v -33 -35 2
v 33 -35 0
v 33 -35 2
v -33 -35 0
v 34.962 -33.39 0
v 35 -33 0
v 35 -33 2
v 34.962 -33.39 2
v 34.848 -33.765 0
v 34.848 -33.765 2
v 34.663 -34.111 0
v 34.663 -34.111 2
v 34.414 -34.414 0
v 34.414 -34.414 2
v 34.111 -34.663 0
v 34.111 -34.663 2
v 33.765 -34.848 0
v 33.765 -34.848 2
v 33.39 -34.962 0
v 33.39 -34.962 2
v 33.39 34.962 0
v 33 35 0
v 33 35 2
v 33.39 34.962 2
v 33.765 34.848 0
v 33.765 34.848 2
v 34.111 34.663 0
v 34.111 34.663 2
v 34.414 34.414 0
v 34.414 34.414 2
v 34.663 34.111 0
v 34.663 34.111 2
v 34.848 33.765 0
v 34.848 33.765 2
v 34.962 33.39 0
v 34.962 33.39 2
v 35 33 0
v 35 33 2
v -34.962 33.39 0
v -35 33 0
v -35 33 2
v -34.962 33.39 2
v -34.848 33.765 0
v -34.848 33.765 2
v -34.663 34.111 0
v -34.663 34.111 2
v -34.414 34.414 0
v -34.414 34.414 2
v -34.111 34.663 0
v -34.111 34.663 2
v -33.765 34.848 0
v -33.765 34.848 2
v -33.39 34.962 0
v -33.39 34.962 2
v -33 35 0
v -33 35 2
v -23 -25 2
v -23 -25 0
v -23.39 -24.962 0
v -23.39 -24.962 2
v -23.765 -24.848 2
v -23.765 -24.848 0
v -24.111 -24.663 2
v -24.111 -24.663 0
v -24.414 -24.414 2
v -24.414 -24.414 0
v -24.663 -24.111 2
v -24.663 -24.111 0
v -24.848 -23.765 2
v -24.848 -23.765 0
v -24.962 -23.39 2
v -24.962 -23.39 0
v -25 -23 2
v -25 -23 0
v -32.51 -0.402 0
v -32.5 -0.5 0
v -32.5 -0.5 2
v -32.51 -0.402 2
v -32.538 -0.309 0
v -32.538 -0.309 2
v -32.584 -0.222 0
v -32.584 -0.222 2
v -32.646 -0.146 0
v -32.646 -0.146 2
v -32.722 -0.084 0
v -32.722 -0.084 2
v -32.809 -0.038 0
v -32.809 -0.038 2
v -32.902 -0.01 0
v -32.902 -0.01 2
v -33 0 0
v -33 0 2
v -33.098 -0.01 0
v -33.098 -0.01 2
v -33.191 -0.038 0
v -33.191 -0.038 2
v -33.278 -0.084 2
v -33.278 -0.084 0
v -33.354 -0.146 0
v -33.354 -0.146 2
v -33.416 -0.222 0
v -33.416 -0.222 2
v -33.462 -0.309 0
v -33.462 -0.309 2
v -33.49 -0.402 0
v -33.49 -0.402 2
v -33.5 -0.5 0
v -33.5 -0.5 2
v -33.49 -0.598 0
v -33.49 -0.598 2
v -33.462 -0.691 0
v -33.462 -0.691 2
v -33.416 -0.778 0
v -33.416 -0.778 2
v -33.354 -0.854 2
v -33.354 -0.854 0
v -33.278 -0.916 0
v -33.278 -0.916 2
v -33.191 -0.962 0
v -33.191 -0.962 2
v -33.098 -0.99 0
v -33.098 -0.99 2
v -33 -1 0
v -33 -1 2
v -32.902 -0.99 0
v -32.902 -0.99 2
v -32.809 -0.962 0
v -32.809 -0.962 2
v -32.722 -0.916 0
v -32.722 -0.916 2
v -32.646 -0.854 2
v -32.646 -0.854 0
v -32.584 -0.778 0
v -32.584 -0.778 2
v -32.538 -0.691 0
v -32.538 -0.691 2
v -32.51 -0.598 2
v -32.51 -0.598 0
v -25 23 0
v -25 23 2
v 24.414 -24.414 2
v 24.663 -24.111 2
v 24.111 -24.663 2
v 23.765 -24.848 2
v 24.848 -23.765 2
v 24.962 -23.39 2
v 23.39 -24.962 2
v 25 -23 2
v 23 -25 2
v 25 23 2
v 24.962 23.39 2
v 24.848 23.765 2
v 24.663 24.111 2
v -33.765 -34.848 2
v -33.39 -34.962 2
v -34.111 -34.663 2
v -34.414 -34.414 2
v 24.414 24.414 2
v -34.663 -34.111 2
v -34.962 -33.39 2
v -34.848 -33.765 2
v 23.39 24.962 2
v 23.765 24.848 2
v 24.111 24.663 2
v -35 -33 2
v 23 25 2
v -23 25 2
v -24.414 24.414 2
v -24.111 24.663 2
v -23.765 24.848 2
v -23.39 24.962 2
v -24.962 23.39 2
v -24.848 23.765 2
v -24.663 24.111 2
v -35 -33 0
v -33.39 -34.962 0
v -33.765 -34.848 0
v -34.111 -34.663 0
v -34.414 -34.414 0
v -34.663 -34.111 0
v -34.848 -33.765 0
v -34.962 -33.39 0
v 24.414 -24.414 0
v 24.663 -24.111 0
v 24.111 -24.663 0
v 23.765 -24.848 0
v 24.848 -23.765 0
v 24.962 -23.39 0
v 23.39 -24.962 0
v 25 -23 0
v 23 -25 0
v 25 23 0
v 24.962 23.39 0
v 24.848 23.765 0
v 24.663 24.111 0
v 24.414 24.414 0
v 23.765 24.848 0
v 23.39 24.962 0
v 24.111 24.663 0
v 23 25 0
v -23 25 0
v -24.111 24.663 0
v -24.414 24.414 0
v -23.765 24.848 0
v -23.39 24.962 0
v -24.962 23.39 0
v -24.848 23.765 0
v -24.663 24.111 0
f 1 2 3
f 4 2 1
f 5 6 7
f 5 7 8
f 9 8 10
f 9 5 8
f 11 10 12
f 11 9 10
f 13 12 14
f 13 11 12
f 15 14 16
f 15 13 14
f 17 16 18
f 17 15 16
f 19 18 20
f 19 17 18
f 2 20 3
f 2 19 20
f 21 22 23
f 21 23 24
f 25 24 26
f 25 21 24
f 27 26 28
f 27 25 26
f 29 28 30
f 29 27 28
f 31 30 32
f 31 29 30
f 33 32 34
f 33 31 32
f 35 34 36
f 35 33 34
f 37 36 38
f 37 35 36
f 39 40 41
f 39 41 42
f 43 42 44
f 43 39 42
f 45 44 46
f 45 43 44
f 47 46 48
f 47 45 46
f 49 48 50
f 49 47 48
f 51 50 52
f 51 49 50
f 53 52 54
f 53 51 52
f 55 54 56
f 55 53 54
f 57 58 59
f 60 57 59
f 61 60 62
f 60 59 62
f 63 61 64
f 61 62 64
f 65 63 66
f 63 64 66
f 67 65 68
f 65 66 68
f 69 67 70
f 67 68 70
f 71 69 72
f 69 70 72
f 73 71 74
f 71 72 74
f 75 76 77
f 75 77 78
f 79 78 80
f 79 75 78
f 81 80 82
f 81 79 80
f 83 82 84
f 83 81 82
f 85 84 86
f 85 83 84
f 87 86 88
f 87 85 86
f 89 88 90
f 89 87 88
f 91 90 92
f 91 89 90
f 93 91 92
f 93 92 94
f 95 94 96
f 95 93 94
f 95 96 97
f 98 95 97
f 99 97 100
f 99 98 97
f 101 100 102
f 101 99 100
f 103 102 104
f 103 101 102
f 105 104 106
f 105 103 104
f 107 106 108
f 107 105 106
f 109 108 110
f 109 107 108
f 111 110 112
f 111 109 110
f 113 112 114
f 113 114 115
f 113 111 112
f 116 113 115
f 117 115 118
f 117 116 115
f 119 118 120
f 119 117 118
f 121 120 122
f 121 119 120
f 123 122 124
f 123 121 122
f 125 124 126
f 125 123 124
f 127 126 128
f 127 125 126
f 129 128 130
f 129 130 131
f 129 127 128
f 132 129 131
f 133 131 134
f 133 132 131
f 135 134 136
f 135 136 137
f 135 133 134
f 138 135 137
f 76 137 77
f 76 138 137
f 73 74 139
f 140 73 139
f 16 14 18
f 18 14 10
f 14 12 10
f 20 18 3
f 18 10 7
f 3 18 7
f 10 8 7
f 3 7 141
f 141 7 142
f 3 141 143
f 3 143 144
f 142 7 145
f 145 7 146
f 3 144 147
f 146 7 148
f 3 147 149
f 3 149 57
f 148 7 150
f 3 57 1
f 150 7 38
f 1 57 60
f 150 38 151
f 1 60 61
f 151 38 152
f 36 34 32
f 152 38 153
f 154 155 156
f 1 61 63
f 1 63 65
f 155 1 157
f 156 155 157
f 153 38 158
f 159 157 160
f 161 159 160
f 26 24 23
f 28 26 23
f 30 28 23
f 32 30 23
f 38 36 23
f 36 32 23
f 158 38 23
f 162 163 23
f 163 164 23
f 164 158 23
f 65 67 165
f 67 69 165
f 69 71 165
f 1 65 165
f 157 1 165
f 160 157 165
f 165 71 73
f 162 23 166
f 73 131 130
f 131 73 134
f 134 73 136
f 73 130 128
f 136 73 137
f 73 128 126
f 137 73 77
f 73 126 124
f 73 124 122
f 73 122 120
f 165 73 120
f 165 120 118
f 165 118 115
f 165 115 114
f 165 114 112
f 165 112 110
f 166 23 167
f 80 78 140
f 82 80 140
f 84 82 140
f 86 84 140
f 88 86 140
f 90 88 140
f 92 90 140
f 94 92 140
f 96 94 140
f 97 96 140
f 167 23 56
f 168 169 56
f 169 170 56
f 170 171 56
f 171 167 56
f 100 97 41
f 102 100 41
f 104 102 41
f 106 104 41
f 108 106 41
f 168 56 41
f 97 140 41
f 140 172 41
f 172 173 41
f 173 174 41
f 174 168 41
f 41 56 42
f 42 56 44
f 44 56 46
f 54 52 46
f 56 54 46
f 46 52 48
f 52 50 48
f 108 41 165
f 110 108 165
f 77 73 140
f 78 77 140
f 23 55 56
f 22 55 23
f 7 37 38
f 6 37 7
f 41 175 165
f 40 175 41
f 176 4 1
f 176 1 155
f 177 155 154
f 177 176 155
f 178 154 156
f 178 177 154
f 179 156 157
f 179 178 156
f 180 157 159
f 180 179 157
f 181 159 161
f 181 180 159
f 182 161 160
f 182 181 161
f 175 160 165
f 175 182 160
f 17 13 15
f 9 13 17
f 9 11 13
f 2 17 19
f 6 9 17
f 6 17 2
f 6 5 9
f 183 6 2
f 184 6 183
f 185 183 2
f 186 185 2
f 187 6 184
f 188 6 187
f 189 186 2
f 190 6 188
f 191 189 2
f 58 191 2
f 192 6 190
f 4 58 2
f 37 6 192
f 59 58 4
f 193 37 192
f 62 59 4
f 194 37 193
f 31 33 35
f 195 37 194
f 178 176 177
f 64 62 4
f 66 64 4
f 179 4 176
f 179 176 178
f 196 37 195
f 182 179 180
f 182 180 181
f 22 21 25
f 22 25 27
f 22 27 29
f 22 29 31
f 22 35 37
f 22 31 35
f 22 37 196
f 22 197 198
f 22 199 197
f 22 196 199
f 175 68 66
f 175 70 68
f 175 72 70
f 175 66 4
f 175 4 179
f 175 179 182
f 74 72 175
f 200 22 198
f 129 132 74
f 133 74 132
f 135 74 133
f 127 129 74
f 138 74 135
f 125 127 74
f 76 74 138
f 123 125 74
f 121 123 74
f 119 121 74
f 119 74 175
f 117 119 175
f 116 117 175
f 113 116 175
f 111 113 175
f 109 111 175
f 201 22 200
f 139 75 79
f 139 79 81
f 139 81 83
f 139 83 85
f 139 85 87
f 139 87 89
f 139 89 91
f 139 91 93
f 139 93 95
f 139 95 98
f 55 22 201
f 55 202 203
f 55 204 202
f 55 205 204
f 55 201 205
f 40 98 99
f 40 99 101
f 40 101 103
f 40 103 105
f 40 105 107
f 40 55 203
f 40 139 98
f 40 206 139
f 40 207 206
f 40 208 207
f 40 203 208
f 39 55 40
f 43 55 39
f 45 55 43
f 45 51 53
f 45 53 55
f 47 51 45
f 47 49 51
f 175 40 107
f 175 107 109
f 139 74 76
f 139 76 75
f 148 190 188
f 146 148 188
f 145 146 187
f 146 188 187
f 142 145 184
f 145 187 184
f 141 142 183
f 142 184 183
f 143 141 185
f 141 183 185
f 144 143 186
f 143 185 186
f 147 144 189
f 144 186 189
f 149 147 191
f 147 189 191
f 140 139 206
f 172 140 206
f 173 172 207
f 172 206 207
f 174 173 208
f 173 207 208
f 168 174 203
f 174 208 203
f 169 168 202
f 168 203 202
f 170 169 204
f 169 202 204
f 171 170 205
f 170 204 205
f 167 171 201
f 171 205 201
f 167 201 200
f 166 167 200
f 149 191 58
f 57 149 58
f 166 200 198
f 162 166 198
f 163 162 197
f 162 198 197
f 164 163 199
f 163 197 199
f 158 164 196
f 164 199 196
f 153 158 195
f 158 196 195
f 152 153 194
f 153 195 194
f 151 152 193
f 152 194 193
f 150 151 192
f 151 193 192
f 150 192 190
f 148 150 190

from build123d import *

# Parameters (mm, degrees)
EXTRUDE_1_DEPTH     = 2
SKETCH_2_R          = 0.5
CUT_EXTRUDE_3_DEPTH = 2


with BuildPart() as part:
    # Эскиз1 → Бобышка-Вытянуть1 (new body)
    with BuildSketch(Plane.XY):
        with BuildLine():
            Line((33, -35), (-33, -35))
            ThreePointArc((-33, -35), (-34.414213562, -34.414213562), (-35, -33))
            Line((-35, -33), (-35, 33))
            ThreePointArc((-35, 33), (-34.414213562, 34.414213562), (-33, 35))
            Line((-33, 35), (33, 35))
            ThreePointArc((33, 35), (34.414213562, 34.414213562), (35, 33))
            Line((35, 33), (35, -33))
            ThreePointArc((35, -33), (34.414213562, -34.414213562), (33, -35))
        make_face()
        with BuildLine():
            Line((23, -25), (-23, -25))
            ThreePointArc((-23, -25), (-24.414213562, -24.414213562), (-25, -23))
            Line((-25, -23), (-25, 23))
            ThreePointArc((-25, 23), (-24.414213562, 24.414213562), (-23, 25))
            Line((-23, 25), (23, 25))
            ThreePointArc((23, 25), (24.414213562, 24.414213562), (25, 23))
            Line((25, 23), (25, -23))
            ThreePointArc((25, -23), (24.414213562, -24.414213562), (23, -25))
        make_face(mode=Mode.SUBTRACT)
    extrude(amount=EXTRUDE_1_DEPTH)

    # Эскиз2 → Вырез-Вытянуть3 (cut)
    with BuildSketch(Plane.XY):
        with Locations((-33, -0.5)):
            Circle(SKETCH_2_R)
    extrude(amount=CUT_EXTRUDE_3_DEPTH, mode=Mode.SUBTRACT)


solid = part.part
